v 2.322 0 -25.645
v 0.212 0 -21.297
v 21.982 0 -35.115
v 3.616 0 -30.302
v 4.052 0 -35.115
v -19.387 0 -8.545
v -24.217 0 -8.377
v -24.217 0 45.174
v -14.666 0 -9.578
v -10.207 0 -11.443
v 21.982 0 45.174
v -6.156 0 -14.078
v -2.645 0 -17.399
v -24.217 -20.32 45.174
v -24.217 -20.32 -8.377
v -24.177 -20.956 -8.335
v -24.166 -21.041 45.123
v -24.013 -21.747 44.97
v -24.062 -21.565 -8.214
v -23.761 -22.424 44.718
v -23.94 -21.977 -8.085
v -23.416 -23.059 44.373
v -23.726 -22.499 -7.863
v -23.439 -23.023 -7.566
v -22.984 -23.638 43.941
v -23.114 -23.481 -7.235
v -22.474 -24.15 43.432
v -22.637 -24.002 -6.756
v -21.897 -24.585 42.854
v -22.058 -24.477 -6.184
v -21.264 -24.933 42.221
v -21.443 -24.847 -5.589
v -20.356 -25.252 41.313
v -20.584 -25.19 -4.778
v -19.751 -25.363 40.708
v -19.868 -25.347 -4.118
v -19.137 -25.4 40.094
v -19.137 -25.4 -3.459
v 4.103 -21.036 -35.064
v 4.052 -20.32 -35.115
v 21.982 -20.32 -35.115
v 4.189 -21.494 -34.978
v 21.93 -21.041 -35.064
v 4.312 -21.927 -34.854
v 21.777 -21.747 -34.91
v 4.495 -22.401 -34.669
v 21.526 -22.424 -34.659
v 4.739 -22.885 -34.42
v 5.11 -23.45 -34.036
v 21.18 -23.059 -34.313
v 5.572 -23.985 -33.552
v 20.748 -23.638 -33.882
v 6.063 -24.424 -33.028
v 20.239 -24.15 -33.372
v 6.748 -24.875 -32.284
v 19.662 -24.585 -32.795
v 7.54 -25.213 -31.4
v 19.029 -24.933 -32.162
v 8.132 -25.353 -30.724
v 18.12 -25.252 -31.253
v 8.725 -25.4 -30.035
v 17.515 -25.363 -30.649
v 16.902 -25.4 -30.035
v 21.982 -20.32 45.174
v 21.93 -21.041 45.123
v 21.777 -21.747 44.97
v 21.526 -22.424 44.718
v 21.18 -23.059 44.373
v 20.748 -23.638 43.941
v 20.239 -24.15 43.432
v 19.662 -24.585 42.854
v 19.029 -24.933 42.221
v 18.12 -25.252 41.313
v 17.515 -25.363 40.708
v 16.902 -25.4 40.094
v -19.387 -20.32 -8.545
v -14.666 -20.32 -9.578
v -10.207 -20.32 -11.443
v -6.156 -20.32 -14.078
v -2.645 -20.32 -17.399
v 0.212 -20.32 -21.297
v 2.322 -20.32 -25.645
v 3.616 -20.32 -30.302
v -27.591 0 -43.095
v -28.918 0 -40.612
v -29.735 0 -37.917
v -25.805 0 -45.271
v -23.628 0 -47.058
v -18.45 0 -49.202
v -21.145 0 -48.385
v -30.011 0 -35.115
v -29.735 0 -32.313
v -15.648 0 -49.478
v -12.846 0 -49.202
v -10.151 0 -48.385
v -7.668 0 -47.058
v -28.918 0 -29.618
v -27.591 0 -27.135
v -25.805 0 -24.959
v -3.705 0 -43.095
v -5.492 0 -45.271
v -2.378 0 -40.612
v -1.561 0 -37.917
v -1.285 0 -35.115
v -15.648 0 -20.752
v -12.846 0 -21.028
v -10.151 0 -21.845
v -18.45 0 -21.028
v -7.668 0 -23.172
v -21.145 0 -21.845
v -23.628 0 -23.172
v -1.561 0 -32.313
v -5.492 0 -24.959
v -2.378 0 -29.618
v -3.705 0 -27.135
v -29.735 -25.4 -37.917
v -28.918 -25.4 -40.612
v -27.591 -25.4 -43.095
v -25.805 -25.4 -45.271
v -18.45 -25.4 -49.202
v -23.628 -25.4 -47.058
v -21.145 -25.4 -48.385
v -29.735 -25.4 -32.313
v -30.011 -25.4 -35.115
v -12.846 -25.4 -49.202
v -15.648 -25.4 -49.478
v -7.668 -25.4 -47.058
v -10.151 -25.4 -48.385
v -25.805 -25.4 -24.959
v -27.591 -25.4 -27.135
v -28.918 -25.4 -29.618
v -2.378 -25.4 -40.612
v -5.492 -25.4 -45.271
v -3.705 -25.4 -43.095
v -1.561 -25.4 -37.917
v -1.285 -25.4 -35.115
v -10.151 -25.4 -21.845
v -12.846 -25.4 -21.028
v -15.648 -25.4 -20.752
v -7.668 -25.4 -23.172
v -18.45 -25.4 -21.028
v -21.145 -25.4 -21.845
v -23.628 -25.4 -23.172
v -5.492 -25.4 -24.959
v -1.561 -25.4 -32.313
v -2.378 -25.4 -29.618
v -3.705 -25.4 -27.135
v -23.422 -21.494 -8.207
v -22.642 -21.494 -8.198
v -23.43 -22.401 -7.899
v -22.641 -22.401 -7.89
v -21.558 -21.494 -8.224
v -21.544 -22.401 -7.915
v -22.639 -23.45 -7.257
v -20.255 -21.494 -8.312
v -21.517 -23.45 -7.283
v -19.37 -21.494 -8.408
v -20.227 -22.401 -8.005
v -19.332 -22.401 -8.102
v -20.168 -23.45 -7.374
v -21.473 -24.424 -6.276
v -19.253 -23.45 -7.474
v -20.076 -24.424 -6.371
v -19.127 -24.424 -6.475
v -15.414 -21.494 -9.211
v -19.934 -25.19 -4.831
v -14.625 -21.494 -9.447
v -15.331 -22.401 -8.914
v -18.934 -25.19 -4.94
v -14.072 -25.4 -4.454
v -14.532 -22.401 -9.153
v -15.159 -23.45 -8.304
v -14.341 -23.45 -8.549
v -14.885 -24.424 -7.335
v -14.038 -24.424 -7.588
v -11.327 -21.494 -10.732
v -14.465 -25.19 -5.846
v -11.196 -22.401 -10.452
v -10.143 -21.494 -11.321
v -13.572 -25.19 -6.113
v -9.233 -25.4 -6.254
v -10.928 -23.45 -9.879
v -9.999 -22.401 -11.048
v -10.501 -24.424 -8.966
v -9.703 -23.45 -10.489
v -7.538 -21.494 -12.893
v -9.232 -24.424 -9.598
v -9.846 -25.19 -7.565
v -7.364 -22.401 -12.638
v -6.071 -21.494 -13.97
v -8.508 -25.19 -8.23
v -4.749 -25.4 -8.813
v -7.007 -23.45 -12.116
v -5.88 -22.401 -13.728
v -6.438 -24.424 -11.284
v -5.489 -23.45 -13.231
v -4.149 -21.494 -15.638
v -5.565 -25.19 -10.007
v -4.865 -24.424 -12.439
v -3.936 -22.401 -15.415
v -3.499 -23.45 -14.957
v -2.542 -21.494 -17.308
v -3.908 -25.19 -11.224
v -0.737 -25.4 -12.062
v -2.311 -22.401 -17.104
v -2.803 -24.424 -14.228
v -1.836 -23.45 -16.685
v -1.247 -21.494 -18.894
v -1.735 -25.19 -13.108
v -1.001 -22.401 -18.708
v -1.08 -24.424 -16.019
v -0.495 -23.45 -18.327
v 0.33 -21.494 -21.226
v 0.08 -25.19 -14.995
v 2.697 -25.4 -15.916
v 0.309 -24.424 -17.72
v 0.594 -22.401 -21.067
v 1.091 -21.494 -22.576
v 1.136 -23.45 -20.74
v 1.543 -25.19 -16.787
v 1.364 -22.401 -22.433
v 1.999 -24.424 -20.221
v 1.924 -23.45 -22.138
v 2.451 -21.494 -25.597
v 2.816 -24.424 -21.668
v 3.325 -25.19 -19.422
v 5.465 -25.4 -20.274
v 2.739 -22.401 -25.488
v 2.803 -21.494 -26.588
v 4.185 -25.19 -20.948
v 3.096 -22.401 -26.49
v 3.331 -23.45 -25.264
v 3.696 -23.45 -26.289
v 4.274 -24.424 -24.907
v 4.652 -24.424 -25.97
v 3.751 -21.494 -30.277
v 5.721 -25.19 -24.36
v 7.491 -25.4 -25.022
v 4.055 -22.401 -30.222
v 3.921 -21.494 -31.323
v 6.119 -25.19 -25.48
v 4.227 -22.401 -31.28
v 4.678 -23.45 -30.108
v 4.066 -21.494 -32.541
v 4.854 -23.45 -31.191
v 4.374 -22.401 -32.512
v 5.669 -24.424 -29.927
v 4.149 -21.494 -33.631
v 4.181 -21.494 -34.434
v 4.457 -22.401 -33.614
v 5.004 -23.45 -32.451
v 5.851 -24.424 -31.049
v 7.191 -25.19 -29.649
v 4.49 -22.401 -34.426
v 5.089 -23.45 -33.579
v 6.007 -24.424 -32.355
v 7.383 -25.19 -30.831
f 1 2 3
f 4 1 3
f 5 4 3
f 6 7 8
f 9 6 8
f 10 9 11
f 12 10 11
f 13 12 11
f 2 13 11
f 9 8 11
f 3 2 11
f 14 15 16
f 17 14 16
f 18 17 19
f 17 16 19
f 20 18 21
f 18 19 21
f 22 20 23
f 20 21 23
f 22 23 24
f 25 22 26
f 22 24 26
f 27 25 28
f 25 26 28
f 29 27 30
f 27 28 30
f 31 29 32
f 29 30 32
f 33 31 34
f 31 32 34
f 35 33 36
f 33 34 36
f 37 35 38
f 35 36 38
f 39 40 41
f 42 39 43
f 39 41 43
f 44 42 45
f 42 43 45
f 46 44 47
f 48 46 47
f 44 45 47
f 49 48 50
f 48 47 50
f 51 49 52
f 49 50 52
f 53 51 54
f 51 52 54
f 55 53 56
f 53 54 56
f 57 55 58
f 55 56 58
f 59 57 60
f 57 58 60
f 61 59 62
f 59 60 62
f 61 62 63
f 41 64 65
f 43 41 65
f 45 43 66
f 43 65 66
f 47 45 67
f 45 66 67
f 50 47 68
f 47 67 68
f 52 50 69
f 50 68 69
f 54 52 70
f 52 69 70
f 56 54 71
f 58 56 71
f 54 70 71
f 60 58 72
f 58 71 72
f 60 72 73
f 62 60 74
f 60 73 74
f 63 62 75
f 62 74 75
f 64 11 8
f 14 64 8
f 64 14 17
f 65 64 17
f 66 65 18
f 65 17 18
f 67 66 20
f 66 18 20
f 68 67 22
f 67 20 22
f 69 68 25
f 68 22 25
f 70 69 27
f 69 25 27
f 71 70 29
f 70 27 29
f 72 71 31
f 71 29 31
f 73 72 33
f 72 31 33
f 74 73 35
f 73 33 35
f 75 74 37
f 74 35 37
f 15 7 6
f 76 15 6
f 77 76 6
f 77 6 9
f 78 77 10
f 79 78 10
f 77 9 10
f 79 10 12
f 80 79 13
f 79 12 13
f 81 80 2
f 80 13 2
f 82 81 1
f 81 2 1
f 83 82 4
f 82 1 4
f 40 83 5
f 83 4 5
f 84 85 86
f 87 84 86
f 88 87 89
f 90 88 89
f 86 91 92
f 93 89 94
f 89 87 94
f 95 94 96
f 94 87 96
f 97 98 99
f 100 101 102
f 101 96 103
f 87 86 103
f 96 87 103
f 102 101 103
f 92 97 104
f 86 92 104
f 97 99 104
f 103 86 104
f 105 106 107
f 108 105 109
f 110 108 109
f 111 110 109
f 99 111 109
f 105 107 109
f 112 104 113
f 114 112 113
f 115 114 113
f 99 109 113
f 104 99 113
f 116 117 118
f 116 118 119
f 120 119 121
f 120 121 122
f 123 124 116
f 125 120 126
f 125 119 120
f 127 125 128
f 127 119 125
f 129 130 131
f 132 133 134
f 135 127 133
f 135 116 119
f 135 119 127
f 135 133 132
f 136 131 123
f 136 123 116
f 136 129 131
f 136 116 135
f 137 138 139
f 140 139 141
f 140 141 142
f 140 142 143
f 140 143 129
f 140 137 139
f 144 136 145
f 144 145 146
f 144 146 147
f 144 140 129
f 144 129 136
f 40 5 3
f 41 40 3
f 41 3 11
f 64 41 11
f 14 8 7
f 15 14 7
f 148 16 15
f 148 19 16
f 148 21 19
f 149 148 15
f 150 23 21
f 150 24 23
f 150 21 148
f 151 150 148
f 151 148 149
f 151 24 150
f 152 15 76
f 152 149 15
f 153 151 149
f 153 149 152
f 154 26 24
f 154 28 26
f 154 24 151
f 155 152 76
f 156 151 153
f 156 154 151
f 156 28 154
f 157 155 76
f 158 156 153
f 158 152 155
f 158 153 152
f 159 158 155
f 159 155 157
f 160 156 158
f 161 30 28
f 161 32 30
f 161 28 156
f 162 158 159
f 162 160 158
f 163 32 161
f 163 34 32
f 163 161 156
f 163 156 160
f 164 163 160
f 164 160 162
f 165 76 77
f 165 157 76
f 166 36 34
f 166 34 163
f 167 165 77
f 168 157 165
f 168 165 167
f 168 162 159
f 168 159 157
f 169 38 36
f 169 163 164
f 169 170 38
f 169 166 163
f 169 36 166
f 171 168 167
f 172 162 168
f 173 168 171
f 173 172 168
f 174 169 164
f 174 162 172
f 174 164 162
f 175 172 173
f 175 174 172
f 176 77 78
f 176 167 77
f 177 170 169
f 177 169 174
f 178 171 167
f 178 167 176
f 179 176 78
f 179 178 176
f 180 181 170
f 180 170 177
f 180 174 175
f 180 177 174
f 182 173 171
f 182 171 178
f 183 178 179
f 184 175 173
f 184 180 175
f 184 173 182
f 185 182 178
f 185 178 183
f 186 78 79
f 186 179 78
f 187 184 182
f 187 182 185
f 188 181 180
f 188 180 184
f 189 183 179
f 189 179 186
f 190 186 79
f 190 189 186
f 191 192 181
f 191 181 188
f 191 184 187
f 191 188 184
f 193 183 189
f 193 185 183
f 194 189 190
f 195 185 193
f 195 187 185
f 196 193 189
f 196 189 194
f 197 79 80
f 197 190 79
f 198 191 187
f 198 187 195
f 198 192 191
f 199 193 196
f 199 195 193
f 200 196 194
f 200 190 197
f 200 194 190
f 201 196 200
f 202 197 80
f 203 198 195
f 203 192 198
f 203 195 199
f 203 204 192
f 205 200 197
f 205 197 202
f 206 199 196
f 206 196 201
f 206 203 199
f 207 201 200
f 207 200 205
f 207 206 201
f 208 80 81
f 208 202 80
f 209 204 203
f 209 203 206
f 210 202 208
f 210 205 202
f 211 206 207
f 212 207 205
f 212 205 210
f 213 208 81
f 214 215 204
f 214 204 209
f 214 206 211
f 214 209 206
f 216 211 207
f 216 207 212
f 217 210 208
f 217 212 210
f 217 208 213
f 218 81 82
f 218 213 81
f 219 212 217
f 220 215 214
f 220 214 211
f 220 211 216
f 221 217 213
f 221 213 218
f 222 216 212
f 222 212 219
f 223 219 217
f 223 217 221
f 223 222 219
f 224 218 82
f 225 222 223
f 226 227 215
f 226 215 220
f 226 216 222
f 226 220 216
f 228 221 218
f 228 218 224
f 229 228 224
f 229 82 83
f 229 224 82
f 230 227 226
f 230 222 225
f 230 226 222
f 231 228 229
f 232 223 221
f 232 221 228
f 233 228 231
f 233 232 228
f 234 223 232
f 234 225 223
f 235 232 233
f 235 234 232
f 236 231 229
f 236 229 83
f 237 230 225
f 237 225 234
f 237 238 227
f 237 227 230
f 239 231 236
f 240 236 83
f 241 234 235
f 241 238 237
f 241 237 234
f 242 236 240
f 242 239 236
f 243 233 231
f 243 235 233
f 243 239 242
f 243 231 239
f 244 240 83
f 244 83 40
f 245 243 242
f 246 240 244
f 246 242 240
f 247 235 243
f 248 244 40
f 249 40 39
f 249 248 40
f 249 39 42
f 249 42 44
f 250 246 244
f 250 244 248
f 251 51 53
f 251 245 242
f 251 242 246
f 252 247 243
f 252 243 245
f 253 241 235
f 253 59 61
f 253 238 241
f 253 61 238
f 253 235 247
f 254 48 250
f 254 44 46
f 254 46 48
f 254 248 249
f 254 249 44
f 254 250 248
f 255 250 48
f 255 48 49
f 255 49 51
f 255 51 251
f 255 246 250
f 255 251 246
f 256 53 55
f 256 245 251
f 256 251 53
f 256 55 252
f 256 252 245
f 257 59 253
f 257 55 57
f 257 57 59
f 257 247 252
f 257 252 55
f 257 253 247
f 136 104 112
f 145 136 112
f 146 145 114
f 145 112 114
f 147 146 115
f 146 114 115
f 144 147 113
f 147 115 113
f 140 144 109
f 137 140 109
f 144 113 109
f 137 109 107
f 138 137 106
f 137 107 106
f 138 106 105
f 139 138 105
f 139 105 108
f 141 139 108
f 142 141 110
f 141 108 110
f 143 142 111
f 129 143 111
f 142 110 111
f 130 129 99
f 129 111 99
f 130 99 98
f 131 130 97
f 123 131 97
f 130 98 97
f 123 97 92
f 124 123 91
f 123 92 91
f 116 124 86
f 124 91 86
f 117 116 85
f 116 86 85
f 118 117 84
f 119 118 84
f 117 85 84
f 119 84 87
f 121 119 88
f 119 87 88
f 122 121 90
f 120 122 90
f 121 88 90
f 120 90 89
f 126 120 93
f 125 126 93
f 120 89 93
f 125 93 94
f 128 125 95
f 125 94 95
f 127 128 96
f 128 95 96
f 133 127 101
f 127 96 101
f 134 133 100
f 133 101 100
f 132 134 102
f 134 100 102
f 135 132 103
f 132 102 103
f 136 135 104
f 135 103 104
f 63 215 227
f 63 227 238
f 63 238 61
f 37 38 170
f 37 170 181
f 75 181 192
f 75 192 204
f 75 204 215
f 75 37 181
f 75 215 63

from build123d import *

# Parameters (mm, degrees)
F0_R     = 14.363391
F1_DEPTH = 25.4
F2_R     = 5.08


with BuildPart() as f1:
    # F0 (on Front) → F1 (new body)
    with BuildSketch(Plane.XZ):
        with BuildLine():
            Line((21.981793, 45.174446), (-24.217229, 45.174446))
            Line((-24.217229, 45.174446), (-24.217229, -8.377207))
            ThreePointArc((-24.217229, -8.377207), (-4.325571, -15.659411), (4.052336, -35.114981))
            Line((4.052336, -35.114981), (21.981793, -35.114981))
            Line((21.981793, -35.114981), (21.981793, 45.174446))
        make_face()
        with Locations((-15.648056, -35.114981)):
            Circle(F0_R)
    extrude(amount=F1_DEPTH)

    # F2
    f2_edges = [f1.edges().sort_by_distance(p)[0] for p in [
        (-24.217229, -25.4, 18.39862),
        (-4.325571, -25.4, -15.659411),
        (13.017064, -25.4, -35.114981),
        (21.981793, -25.4, 5.029732),
        (-1.117718, -25.4, 45.174446),
    ]]
    fillet(f2_edges, radius=F2_R)


solid = f1.part
